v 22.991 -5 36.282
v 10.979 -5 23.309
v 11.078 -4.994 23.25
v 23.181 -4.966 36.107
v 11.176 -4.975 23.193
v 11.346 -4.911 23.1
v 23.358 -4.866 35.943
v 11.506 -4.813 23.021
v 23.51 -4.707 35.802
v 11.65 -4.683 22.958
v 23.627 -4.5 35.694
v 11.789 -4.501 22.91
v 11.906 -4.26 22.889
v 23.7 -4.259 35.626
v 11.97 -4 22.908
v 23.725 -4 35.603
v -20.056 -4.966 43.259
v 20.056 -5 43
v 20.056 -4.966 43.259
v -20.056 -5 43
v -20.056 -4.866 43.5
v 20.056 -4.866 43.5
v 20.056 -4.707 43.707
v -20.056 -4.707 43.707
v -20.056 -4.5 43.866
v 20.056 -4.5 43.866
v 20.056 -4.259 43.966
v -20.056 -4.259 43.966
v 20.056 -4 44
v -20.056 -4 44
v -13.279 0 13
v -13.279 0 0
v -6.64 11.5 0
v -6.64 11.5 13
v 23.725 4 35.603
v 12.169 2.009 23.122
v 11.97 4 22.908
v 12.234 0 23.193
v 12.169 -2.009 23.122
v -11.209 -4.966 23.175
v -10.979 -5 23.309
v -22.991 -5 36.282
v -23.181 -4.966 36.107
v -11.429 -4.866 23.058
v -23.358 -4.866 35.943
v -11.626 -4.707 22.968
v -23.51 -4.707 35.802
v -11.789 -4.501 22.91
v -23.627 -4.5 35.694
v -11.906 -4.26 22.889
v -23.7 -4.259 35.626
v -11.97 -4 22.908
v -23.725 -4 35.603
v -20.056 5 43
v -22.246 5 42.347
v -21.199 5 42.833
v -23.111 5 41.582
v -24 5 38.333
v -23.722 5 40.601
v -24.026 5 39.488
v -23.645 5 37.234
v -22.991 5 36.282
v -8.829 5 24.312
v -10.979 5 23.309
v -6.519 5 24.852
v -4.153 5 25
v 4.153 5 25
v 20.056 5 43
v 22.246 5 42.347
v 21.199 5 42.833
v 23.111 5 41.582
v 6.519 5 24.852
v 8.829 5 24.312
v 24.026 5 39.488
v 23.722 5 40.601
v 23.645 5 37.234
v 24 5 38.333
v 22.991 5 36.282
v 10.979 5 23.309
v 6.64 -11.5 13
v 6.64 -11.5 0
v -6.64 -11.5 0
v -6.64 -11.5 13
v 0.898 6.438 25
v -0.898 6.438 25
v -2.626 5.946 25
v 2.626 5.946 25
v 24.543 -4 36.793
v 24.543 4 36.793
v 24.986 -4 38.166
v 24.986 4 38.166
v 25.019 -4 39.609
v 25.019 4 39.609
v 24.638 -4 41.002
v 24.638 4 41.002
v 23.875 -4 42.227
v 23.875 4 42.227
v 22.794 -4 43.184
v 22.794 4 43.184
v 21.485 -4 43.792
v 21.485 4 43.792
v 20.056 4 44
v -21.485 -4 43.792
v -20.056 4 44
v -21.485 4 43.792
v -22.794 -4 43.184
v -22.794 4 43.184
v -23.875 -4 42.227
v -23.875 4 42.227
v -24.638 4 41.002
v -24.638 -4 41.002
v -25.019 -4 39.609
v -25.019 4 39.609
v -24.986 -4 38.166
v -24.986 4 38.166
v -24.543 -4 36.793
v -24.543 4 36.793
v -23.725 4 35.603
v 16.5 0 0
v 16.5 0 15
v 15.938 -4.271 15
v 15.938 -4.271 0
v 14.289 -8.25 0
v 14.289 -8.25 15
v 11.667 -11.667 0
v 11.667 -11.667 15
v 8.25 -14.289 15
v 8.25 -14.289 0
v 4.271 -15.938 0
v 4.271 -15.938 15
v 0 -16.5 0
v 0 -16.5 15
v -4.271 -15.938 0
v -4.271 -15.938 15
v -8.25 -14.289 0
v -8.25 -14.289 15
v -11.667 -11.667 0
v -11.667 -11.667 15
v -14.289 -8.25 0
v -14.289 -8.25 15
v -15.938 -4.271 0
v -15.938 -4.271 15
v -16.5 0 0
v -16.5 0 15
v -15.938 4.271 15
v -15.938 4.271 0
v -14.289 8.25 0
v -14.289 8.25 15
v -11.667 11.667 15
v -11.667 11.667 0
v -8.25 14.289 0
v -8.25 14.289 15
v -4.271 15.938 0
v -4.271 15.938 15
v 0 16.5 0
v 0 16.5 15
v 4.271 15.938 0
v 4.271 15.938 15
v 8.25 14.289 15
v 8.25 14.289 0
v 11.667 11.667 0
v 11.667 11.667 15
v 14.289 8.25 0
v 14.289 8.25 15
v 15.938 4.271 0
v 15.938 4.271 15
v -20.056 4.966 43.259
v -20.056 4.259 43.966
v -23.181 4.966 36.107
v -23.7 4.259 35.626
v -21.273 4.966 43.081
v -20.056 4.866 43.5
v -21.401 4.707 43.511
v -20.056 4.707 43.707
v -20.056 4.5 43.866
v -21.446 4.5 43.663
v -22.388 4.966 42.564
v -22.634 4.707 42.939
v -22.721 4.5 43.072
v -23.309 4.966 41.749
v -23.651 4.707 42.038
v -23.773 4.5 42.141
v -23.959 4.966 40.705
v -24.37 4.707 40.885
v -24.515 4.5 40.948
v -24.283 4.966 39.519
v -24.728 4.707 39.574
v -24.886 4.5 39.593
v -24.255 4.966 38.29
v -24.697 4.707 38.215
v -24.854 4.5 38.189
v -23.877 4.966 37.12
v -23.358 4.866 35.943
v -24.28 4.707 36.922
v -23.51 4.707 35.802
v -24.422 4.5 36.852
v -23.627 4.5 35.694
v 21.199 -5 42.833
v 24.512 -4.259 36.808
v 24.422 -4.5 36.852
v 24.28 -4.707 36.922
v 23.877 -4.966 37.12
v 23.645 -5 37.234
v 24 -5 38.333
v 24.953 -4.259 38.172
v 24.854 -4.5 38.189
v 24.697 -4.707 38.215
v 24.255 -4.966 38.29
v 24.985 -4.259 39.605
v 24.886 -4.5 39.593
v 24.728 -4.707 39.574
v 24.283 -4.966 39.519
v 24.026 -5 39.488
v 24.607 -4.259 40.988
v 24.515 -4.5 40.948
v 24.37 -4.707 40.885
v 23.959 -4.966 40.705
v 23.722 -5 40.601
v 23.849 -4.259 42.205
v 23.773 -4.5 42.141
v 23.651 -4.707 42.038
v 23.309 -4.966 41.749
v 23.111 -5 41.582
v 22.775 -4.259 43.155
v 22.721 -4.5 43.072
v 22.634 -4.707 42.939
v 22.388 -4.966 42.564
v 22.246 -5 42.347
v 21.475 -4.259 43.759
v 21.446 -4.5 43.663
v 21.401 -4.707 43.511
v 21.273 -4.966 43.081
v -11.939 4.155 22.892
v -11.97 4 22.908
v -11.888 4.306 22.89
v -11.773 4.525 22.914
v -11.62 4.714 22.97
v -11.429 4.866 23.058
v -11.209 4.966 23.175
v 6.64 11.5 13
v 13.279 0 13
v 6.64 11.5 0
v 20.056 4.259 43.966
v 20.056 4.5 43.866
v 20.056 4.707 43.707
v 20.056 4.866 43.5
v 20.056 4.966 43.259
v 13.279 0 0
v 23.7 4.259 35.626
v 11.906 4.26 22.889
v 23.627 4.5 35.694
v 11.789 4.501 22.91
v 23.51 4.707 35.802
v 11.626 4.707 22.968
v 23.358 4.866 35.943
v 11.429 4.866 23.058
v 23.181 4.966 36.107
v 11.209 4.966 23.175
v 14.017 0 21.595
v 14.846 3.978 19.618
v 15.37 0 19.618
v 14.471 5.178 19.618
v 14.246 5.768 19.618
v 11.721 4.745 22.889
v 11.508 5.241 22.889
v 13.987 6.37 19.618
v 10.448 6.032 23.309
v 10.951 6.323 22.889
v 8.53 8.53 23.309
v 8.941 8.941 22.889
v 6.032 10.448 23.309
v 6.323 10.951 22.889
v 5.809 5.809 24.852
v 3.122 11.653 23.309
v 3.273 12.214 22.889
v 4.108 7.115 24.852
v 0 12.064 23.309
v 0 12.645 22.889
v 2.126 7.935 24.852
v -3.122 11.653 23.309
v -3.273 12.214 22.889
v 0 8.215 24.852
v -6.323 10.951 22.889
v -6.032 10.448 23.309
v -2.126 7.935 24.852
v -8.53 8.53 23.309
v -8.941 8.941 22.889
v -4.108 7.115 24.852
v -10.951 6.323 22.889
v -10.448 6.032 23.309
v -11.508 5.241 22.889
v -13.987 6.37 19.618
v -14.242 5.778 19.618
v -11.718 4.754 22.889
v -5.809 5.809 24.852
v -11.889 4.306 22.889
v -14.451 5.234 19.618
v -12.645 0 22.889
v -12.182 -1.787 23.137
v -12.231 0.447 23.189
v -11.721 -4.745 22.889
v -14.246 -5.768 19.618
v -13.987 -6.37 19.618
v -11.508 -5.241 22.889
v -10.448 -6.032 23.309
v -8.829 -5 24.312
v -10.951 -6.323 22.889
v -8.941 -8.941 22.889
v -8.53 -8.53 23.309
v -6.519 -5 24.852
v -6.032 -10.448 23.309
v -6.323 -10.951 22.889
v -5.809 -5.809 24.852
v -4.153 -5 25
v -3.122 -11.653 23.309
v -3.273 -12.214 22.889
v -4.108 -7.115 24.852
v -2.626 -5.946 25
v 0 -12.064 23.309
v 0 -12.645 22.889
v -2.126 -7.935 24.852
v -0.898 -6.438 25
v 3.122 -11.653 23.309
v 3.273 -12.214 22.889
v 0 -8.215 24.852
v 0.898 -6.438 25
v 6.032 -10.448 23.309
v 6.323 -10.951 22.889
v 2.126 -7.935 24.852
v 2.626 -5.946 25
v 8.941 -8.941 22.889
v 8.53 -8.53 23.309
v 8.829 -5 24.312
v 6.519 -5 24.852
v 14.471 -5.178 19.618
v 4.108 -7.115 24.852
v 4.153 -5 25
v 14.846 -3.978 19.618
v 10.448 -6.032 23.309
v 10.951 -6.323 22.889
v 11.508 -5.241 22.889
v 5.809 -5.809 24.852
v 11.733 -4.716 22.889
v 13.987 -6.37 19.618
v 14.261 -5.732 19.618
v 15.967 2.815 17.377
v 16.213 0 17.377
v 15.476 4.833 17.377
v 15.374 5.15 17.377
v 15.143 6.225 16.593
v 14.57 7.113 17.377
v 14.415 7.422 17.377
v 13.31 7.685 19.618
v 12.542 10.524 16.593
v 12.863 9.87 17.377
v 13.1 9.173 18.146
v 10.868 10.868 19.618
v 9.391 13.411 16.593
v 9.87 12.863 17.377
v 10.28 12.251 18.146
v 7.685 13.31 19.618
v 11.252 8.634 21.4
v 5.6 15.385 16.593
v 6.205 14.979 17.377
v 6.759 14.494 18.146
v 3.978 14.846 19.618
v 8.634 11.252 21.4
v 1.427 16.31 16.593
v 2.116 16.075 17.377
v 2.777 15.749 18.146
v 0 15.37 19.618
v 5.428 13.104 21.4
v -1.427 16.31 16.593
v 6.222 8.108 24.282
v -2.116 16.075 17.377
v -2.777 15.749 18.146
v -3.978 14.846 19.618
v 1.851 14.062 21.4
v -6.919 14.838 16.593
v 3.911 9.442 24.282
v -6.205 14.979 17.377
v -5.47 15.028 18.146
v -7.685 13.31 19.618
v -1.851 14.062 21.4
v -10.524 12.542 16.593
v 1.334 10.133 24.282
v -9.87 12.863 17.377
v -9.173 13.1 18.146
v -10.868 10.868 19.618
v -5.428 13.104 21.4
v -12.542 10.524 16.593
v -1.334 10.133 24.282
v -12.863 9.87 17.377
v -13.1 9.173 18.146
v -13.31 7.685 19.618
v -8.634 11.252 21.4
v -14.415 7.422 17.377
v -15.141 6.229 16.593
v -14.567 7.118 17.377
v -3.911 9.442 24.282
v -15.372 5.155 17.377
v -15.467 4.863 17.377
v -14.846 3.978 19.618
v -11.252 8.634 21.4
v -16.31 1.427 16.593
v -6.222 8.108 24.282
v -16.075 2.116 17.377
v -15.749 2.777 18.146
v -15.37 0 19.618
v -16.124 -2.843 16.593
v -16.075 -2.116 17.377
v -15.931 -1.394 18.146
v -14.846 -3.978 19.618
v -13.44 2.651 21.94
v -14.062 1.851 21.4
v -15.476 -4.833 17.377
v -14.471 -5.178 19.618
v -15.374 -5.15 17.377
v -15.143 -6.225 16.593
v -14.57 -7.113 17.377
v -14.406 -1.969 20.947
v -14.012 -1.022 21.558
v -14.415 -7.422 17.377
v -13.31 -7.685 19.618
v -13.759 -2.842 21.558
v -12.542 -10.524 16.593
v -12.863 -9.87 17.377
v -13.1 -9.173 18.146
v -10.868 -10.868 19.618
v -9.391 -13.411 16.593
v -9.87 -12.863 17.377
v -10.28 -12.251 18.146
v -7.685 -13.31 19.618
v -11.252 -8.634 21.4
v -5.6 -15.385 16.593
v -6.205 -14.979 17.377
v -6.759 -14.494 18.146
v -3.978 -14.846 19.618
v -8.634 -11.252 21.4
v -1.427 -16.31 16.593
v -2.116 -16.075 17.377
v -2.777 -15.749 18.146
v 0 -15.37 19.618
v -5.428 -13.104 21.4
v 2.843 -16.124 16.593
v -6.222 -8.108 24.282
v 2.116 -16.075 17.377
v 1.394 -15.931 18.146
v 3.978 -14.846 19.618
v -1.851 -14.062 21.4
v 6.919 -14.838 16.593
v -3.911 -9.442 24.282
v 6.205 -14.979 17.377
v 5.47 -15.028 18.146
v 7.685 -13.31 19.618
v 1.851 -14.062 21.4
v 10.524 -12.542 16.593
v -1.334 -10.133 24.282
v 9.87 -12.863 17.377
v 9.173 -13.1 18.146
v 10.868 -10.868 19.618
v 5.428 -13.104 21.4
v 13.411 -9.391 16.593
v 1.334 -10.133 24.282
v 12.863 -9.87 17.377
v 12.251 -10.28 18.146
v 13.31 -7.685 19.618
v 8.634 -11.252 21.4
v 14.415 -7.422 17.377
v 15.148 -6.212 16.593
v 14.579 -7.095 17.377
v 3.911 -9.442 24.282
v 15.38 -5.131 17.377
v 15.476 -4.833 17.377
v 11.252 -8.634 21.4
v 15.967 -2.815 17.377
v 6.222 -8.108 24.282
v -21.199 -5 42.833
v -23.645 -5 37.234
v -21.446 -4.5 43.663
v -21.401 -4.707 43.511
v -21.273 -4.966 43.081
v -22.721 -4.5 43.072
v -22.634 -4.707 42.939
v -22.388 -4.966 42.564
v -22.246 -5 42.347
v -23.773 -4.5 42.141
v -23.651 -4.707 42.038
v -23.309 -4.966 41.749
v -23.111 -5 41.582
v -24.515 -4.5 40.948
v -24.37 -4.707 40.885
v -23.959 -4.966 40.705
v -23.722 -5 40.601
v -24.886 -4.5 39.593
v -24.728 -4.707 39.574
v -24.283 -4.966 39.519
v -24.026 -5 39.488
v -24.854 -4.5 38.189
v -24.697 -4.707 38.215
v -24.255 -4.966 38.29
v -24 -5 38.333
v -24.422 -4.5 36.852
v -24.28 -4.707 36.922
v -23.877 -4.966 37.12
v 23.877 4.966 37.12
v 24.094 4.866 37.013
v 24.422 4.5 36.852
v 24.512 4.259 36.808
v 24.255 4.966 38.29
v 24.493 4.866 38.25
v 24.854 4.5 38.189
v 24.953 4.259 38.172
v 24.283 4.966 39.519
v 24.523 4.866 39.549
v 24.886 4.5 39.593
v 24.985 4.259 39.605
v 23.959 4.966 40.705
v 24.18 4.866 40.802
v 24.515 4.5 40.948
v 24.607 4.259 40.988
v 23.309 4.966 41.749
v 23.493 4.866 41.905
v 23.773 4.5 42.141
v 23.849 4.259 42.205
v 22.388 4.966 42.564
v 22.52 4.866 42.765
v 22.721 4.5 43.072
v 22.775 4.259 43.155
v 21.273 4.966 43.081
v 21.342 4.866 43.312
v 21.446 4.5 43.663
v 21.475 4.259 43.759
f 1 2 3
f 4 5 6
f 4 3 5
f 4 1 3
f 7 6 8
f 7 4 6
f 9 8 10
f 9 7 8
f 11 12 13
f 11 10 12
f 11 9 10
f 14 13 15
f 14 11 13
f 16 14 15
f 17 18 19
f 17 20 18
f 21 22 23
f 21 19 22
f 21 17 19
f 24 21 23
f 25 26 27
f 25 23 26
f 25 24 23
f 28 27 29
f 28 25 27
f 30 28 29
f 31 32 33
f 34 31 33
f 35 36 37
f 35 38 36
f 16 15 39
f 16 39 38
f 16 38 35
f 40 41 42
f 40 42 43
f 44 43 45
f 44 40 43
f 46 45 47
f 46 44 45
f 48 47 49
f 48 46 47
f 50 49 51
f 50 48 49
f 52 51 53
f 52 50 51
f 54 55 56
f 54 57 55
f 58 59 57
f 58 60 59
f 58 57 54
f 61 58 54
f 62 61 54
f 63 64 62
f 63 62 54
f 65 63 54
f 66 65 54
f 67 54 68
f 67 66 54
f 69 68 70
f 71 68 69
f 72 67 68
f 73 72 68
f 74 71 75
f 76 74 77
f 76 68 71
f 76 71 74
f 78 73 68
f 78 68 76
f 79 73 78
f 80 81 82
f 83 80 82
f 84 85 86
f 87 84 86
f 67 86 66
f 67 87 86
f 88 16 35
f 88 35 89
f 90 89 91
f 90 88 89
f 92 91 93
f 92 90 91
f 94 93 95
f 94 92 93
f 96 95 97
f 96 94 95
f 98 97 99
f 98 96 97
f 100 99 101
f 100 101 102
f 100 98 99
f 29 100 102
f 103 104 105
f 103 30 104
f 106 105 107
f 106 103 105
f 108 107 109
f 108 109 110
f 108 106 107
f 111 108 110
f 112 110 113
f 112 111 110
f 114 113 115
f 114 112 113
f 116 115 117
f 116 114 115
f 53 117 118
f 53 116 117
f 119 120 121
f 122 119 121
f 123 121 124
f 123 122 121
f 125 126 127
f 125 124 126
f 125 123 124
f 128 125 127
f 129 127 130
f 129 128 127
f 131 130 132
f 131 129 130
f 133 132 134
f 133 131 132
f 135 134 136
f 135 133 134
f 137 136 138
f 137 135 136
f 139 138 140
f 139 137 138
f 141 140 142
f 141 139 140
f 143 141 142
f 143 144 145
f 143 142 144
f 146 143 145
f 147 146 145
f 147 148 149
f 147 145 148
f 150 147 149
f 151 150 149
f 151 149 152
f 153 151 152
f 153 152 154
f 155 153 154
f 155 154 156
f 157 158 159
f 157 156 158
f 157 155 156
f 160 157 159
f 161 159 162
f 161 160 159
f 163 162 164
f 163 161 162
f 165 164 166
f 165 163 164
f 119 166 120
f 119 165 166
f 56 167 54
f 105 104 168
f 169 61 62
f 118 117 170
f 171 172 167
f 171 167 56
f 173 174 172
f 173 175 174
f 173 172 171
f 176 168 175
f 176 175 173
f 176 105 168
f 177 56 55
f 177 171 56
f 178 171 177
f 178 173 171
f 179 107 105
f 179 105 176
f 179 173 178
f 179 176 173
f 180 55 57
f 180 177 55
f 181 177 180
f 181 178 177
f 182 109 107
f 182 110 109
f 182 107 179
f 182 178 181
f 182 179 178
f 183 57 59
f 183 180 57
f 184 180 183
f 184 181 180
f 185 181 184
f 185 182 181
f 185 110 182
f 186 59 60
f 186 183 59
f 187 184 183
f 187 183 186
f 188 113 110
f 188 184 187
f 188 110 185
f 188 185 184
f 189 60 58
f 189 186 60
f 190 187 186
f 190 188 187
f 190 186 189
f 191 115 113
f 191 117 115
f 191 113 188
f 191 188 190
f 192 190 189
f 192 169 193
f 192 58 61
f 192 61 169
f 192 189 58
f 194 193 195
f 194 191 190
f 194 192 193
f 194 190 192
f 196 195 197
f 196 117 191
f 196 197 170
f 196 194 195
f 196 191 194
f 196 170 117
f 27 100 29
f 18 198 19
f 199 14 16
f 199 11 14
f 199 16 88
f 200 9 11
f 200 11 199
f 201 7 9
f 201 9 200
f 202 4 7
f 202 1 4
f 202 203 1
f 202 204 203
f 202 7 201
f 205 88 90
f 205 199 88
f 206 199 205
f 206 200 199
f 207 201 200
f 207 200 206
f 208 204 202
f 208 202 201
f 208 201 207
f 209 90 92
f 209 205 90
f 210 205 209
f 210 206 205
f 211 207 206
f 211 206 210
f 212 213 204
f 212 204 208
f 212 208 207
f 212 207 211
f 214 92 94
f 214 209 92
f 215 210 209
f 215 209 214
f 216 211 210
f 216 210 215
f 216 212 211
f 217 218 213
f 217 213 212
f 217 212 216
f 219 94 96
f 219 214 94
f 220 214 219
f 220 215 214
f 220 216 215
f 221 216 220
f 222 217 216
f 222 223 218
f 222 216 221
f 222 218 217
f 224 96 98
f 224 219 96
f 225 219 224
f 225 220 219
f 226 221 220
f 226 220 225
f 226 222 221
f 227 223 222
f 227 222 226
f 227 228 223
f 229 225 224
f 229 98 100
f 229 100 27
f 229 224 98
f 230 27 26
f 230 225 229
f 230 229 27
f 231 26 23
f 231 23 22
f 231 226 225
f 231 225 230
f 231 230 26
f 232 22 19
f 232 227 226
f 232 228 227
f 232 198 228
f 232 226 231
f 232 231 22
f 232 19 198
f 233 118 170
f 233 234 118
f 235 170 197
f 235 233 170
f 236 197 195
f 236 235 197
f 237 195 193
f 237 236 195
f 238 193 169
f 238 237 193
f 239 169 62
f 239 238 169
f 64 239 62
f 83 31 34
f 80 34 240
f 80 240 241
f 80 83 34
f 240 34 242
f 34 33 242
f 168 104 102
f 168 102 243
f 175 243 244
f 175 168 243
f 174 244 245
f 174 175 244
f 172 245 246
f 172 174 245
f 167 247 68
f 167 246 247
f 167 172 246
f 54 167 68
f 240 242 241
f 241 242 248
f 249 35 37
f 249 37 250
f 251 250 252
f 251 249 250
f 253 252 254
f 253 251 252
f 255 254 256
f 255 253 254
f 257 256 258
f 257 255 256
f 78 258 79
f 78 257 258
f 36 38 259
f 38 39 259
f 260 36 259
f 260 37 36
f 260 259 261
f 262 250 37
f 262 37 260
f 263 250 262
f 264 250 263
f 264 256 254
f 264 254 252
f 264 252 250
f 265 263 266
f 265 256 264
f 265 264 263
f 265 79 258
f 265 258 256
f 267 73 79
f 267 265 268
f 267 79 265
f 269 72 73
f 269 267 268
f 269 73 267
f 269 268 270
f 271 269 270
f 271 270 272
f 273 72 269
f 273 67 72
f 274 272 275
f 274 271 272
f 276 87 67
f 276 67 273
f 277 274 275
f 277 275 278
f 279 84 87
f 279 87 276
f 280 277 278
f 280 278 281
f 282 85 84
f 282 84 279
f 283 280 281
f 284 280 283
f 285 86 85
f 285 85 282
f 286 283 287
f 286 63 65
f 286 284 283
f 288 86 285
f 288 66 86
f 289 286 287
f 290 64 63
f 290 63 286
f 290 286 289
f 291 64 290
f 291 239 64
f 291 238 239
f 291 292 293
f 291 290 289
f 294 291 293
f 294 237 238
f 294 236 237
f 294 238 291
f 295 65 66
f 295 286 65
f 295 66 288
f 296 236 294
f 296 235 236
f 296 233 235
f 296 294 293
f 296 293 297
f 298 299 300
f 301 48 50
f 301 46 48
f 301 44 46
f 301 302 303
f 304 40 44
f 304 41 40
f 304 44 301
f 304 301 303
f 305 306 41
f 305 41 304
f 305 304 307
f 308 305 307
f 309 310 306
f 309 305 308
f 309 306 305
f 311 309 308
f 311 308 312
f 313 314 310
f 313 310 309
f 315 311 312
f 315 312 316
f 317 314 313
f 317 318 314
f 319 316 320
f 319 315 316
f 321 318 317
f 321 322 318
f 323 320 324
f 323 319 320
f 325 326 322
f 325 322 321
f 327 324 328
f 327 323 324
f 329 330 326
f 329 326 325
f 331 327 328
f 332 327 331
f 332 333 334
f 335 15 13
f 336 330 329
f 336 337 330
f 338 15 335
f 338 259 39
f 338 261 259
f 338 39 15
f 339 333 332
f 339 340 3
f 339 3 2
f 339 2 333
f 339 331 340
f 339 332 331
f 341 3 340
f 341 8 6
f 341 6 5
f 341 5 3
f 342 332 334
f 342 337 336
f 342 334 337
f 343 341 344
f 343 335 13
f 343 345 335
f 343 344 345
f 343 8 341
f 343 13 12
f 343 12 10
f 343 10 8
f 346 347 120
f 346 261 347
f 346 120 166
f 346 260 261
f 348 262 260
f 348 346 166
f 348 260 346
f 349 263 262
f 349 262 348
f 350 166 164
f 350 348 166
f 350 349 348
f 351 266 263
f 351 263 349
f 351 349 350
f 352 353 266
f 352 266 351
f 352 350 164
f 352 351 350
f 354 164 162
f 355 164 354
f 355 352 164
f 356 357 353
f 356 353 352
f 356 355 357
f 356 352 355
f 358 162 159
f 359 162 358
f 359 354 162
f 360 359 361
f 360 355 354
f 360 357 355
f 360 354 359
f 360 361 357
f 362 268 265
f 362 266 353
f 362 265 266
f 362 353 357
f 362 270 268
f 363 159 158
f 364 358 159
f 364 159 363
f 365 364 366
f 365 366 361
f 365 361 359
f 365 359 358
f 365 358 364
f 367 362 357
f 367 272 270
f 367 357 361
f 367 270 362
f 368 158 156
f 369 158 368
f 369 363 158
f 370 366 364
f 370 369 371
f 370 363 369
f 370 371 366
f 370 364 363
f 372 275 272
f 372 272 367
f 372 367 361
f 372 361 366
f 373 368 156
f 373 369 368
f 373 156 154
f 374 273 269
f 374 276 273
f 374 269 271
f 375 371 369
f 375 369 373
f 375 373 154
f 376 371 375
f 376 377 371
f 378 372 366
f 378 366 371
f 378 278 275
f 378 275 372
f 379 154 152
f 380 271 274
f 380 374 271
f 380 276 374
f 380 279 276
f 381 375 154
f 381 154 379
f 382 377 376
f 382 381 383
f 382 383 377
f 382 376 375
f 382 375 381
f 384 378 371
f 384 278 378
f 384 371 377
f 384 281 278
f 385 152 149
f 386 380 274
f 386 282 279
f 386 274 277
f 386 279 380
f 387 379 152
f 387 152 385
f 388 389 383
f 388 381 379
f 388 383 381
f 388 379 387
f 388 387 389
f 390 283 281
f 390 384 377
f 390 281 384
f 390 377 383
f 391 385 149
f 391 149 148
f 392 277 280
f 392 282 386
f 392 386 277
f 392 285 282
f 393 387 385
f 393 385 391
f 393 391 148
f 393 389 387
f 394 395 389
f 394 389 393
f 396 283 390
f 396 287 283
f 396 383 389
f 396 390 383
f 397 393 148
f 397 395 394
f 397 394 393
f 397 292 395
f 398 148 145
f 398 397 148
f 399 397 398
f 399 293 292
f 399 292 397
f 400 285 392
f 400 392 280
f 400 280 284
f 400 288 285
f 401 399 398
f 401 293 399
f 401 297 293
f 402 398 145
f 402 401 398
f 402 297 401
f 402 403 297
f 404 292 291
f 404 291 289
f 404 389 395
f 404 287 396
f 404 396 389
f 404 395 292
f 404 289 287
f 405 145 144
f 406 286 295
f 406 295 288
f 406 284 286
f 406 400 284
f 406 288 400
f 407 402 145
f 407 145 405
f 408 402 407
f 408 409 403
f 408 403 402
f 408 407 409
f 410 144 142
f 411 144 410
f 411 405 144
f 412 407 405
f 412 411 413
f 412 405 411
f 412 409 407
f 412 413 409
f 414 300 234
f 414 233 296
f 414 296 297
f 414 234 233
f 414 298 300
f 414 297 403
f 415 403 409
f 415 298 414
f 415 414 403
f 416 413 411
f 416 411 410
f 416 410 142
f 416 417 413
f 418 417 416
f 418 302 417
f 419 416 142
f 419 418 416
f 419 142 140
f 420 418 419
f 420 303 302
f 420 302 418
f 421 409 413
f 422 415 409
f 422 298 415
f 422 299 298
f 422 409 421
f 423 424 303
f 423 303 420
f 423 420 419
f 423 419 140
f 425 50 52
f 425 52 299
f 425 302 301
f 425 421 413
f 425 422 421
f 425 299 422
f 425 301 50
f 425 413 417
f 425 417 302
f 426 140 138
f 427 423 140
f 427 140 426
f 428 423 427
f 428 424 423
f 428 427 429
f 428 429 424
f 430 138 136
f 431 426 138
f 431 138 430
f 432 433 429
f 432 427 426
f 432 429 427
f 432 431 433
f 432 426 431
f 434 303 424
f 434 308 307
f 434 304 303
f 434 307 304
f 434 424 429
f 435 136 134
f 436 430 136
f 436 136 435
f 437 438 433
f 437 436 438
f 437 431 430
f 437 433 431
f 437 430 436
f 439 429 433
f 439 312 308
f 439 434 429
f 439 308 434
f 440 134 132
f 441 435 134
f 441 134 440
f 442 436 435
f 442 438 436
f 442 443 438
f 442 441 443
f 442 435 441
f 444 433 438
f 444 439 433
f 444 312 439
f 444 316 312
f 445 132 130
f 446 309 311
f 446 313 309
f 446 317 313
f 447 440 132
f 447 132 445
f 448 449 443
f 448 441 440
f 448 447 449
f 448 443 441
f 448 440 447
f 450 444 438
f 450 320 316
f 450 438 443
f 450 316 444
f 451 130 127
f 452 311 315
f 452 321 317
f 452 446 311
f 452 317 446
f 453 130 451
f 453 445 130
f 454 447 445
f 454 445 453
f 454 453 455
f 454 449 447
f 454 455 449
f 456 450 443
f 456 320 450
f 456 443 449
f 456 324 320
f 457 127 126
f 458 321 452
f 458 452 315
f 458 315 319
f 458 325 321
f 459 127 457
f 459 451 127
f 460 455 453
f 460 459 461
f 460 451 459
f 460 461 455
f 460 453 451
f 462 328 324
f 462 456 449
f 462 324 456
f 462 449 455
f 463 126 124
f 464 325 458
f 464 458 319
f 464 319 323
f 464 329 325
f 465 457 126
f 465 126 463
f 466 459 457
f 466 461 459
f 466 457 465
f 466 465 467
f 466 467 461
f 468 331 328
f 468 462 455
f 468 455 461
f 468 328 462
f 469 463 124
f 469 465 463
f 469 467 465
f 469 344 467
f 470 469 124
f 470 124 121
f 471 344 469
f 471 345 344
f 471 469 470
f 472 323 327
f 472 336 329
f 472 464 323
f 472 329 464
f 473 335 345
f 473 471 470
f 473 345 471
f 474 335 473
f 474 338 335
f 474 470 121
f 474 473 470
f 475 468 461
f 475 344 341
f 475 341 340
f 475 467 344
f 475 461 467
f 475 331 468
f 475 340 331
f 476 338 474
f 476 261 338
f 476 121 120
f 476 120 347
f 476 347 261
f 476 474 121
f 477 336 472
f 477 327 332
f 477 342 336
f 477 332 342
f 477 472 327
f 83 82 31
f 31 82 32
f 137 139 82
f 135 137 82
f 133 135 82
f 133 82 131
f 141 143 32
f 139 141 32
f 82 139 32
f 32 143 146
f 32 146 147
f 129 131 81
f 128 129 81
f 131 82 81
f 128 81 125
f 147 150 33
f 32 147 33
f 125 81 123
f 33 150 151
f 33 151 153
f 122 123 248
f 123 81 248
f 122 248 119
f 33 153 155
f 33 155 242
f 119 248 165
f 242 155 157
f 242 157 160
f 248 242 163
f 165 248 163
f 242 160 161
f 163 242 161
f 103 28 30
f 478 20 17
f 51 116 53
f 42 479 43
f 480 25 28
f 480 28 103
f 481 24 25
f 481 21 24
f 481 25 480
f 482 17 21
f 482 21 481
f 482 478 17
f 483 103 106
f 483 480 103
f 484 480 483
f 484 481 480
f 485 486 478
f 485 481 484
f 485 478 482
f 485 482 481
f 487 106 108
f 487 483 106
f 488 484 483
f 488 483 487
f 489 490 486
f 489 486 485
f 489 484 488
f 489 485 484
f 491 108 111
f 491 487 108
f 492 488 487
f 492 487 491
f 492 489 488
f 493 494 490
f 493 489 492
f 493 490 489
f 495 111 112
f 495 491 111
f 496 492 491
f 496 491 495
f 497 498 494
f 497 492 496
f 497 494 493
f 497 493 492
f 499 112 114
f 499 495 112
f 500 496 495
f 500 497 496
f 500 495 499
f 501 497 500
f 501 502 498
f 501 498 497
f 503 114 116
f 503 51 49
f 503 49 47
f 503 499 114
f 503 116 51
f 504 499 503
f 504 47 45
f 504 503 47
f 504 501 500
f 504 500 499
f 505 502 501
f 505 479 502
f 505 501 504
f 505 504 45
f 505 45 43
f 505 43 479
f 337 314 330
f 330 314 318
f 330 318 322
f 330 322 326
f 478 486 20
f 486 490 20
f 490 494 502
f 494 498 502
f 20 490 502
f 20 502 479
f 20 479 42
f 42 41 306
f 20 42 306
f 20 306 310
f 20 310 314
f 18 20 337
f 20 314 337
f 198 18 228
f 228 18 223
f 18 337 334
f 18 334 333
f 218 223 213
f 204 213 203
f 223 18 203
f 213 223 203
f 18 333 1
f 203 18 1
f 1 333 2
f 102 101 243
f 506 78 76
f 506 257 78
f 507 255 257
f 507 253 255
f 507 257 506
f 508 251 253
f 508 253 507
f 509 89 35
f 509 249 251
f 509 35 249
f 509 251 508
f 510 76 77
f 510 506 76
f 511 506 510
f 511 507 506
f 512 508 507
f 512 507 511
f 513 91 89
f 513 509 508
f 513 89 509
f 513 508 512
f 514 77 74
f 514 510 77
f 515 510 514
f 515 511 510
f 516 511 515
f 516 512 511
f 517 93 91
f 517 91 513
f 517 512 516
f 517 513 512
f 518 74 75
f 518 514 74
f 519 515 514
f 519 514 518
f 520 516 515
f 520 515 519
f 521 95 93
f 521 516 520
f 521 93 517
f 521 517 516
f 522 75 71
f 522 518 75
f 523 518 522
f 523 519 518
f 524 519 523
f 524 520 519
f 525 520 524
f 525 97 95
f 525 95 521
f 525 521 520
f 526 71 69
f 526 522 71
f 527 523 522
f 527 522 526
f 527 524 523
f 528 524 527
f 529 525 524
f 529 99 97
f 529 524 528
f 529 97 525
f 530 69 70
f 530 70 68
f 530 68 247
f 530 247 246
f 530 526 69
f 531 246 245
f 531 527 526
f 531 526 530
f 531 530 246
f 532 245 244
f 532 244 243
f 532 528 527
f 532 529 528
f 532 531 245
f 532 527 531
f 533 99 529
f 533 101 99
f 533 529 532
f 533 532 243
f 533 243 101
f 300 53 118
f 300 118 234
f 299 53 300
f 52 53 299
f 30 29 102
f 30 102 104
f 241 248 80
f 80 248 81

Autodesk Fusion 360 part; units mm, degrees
sketch "Skizze1" plane through (0, 0, 0) normal (0, 0, 1) x (1, 0, 0) in component "Teigblume"
  circle A0 centre (0, 0) radius 16.5
  dimension "d1" = 33
extrude "Extrusion1" add sketch "Skizze1" along normal blind 25 in component "Teigblume"
fillet "Abrundung1" radius 10 1 edges at (-15.3834, -5.9667, 25) in component "Teigblume"
sketch "Skizze2" plane through (0, 0, 0) normal (0, 1, 0) x (1, 0, 0) in component "Teigblume"
  line L0 (6.5, -17) -> (31.5, -44)
  line L1 (31.5, -44) -> (-31.5, -44)
  line L2 (-31.5, -44) -> (-6.5, -17)
  line L3 (-6.5, -17) -> (6.5, -17)
  line L4 (-16.5, -15) -> (16.5, -15)
  dimension "d6" = 2
  dimension "d7" = 27
  dimension "d8" = 10
  dimension "d9" = 10
  dimension "d19" = 15
  dimension "d20" = 15
extrude "Extrusion2" add sketch "Skizze2" along normal mid plane 10 in component "Teigblume"
fillet "Abrundung2" radius 5 2 edges at (-31.5, 0, 44) (31.5, 0, 44) in component "Teigblume"
fillet "Abrundung3" radius 1 10 edges at (-17.7705, 5, 29.1721) (-24.6379, 5, 41.0018) (0, 5, 44) (24.6379, 5, 41.0018) (17.7705, 5, 29.1721) (17.7705, -5, 29.1721) (24.6379, -5, 41.0018) (0, -5, 44) (-24.6379, -5, 41.0018) (-17.7705, -5, 29.1721) in component "Teigblume"
sketch "Skizze3" plane through (0, 0, 0) normal (0, 0, -1) x (1, 0, 0) in component "Teigblume"
  circle A0 centre (0, 0) radius 16.5
  line L0 (13.2791, 0) -> (6.6395, 11.5)
  line L1 (6.6395, 11.5) -> (-6.6395, 11.5)
  line L2 (-6.6395, 11.5) -> (-13.2791, 0)
  line L3 (-13.2791, 0) -> (-6.6395, -11.5)
  line L4 (-6.6395, -11.5) -> (6.6395, -11.5)
  line L5 (6.6395, -11.5) -> (13.2791, 0)
  dimension "d16" = 11.5
extrude "Extrusion3" cut sketch "Skizze3" against normal blind 13 contours L0 L1 L2 L3 L4 L5 in component "Teigblume"
component "Teigblume" placed x (1, 0, 0) y (0, 1, 0) z (0, 0, 1) at (0, 0, 0)
